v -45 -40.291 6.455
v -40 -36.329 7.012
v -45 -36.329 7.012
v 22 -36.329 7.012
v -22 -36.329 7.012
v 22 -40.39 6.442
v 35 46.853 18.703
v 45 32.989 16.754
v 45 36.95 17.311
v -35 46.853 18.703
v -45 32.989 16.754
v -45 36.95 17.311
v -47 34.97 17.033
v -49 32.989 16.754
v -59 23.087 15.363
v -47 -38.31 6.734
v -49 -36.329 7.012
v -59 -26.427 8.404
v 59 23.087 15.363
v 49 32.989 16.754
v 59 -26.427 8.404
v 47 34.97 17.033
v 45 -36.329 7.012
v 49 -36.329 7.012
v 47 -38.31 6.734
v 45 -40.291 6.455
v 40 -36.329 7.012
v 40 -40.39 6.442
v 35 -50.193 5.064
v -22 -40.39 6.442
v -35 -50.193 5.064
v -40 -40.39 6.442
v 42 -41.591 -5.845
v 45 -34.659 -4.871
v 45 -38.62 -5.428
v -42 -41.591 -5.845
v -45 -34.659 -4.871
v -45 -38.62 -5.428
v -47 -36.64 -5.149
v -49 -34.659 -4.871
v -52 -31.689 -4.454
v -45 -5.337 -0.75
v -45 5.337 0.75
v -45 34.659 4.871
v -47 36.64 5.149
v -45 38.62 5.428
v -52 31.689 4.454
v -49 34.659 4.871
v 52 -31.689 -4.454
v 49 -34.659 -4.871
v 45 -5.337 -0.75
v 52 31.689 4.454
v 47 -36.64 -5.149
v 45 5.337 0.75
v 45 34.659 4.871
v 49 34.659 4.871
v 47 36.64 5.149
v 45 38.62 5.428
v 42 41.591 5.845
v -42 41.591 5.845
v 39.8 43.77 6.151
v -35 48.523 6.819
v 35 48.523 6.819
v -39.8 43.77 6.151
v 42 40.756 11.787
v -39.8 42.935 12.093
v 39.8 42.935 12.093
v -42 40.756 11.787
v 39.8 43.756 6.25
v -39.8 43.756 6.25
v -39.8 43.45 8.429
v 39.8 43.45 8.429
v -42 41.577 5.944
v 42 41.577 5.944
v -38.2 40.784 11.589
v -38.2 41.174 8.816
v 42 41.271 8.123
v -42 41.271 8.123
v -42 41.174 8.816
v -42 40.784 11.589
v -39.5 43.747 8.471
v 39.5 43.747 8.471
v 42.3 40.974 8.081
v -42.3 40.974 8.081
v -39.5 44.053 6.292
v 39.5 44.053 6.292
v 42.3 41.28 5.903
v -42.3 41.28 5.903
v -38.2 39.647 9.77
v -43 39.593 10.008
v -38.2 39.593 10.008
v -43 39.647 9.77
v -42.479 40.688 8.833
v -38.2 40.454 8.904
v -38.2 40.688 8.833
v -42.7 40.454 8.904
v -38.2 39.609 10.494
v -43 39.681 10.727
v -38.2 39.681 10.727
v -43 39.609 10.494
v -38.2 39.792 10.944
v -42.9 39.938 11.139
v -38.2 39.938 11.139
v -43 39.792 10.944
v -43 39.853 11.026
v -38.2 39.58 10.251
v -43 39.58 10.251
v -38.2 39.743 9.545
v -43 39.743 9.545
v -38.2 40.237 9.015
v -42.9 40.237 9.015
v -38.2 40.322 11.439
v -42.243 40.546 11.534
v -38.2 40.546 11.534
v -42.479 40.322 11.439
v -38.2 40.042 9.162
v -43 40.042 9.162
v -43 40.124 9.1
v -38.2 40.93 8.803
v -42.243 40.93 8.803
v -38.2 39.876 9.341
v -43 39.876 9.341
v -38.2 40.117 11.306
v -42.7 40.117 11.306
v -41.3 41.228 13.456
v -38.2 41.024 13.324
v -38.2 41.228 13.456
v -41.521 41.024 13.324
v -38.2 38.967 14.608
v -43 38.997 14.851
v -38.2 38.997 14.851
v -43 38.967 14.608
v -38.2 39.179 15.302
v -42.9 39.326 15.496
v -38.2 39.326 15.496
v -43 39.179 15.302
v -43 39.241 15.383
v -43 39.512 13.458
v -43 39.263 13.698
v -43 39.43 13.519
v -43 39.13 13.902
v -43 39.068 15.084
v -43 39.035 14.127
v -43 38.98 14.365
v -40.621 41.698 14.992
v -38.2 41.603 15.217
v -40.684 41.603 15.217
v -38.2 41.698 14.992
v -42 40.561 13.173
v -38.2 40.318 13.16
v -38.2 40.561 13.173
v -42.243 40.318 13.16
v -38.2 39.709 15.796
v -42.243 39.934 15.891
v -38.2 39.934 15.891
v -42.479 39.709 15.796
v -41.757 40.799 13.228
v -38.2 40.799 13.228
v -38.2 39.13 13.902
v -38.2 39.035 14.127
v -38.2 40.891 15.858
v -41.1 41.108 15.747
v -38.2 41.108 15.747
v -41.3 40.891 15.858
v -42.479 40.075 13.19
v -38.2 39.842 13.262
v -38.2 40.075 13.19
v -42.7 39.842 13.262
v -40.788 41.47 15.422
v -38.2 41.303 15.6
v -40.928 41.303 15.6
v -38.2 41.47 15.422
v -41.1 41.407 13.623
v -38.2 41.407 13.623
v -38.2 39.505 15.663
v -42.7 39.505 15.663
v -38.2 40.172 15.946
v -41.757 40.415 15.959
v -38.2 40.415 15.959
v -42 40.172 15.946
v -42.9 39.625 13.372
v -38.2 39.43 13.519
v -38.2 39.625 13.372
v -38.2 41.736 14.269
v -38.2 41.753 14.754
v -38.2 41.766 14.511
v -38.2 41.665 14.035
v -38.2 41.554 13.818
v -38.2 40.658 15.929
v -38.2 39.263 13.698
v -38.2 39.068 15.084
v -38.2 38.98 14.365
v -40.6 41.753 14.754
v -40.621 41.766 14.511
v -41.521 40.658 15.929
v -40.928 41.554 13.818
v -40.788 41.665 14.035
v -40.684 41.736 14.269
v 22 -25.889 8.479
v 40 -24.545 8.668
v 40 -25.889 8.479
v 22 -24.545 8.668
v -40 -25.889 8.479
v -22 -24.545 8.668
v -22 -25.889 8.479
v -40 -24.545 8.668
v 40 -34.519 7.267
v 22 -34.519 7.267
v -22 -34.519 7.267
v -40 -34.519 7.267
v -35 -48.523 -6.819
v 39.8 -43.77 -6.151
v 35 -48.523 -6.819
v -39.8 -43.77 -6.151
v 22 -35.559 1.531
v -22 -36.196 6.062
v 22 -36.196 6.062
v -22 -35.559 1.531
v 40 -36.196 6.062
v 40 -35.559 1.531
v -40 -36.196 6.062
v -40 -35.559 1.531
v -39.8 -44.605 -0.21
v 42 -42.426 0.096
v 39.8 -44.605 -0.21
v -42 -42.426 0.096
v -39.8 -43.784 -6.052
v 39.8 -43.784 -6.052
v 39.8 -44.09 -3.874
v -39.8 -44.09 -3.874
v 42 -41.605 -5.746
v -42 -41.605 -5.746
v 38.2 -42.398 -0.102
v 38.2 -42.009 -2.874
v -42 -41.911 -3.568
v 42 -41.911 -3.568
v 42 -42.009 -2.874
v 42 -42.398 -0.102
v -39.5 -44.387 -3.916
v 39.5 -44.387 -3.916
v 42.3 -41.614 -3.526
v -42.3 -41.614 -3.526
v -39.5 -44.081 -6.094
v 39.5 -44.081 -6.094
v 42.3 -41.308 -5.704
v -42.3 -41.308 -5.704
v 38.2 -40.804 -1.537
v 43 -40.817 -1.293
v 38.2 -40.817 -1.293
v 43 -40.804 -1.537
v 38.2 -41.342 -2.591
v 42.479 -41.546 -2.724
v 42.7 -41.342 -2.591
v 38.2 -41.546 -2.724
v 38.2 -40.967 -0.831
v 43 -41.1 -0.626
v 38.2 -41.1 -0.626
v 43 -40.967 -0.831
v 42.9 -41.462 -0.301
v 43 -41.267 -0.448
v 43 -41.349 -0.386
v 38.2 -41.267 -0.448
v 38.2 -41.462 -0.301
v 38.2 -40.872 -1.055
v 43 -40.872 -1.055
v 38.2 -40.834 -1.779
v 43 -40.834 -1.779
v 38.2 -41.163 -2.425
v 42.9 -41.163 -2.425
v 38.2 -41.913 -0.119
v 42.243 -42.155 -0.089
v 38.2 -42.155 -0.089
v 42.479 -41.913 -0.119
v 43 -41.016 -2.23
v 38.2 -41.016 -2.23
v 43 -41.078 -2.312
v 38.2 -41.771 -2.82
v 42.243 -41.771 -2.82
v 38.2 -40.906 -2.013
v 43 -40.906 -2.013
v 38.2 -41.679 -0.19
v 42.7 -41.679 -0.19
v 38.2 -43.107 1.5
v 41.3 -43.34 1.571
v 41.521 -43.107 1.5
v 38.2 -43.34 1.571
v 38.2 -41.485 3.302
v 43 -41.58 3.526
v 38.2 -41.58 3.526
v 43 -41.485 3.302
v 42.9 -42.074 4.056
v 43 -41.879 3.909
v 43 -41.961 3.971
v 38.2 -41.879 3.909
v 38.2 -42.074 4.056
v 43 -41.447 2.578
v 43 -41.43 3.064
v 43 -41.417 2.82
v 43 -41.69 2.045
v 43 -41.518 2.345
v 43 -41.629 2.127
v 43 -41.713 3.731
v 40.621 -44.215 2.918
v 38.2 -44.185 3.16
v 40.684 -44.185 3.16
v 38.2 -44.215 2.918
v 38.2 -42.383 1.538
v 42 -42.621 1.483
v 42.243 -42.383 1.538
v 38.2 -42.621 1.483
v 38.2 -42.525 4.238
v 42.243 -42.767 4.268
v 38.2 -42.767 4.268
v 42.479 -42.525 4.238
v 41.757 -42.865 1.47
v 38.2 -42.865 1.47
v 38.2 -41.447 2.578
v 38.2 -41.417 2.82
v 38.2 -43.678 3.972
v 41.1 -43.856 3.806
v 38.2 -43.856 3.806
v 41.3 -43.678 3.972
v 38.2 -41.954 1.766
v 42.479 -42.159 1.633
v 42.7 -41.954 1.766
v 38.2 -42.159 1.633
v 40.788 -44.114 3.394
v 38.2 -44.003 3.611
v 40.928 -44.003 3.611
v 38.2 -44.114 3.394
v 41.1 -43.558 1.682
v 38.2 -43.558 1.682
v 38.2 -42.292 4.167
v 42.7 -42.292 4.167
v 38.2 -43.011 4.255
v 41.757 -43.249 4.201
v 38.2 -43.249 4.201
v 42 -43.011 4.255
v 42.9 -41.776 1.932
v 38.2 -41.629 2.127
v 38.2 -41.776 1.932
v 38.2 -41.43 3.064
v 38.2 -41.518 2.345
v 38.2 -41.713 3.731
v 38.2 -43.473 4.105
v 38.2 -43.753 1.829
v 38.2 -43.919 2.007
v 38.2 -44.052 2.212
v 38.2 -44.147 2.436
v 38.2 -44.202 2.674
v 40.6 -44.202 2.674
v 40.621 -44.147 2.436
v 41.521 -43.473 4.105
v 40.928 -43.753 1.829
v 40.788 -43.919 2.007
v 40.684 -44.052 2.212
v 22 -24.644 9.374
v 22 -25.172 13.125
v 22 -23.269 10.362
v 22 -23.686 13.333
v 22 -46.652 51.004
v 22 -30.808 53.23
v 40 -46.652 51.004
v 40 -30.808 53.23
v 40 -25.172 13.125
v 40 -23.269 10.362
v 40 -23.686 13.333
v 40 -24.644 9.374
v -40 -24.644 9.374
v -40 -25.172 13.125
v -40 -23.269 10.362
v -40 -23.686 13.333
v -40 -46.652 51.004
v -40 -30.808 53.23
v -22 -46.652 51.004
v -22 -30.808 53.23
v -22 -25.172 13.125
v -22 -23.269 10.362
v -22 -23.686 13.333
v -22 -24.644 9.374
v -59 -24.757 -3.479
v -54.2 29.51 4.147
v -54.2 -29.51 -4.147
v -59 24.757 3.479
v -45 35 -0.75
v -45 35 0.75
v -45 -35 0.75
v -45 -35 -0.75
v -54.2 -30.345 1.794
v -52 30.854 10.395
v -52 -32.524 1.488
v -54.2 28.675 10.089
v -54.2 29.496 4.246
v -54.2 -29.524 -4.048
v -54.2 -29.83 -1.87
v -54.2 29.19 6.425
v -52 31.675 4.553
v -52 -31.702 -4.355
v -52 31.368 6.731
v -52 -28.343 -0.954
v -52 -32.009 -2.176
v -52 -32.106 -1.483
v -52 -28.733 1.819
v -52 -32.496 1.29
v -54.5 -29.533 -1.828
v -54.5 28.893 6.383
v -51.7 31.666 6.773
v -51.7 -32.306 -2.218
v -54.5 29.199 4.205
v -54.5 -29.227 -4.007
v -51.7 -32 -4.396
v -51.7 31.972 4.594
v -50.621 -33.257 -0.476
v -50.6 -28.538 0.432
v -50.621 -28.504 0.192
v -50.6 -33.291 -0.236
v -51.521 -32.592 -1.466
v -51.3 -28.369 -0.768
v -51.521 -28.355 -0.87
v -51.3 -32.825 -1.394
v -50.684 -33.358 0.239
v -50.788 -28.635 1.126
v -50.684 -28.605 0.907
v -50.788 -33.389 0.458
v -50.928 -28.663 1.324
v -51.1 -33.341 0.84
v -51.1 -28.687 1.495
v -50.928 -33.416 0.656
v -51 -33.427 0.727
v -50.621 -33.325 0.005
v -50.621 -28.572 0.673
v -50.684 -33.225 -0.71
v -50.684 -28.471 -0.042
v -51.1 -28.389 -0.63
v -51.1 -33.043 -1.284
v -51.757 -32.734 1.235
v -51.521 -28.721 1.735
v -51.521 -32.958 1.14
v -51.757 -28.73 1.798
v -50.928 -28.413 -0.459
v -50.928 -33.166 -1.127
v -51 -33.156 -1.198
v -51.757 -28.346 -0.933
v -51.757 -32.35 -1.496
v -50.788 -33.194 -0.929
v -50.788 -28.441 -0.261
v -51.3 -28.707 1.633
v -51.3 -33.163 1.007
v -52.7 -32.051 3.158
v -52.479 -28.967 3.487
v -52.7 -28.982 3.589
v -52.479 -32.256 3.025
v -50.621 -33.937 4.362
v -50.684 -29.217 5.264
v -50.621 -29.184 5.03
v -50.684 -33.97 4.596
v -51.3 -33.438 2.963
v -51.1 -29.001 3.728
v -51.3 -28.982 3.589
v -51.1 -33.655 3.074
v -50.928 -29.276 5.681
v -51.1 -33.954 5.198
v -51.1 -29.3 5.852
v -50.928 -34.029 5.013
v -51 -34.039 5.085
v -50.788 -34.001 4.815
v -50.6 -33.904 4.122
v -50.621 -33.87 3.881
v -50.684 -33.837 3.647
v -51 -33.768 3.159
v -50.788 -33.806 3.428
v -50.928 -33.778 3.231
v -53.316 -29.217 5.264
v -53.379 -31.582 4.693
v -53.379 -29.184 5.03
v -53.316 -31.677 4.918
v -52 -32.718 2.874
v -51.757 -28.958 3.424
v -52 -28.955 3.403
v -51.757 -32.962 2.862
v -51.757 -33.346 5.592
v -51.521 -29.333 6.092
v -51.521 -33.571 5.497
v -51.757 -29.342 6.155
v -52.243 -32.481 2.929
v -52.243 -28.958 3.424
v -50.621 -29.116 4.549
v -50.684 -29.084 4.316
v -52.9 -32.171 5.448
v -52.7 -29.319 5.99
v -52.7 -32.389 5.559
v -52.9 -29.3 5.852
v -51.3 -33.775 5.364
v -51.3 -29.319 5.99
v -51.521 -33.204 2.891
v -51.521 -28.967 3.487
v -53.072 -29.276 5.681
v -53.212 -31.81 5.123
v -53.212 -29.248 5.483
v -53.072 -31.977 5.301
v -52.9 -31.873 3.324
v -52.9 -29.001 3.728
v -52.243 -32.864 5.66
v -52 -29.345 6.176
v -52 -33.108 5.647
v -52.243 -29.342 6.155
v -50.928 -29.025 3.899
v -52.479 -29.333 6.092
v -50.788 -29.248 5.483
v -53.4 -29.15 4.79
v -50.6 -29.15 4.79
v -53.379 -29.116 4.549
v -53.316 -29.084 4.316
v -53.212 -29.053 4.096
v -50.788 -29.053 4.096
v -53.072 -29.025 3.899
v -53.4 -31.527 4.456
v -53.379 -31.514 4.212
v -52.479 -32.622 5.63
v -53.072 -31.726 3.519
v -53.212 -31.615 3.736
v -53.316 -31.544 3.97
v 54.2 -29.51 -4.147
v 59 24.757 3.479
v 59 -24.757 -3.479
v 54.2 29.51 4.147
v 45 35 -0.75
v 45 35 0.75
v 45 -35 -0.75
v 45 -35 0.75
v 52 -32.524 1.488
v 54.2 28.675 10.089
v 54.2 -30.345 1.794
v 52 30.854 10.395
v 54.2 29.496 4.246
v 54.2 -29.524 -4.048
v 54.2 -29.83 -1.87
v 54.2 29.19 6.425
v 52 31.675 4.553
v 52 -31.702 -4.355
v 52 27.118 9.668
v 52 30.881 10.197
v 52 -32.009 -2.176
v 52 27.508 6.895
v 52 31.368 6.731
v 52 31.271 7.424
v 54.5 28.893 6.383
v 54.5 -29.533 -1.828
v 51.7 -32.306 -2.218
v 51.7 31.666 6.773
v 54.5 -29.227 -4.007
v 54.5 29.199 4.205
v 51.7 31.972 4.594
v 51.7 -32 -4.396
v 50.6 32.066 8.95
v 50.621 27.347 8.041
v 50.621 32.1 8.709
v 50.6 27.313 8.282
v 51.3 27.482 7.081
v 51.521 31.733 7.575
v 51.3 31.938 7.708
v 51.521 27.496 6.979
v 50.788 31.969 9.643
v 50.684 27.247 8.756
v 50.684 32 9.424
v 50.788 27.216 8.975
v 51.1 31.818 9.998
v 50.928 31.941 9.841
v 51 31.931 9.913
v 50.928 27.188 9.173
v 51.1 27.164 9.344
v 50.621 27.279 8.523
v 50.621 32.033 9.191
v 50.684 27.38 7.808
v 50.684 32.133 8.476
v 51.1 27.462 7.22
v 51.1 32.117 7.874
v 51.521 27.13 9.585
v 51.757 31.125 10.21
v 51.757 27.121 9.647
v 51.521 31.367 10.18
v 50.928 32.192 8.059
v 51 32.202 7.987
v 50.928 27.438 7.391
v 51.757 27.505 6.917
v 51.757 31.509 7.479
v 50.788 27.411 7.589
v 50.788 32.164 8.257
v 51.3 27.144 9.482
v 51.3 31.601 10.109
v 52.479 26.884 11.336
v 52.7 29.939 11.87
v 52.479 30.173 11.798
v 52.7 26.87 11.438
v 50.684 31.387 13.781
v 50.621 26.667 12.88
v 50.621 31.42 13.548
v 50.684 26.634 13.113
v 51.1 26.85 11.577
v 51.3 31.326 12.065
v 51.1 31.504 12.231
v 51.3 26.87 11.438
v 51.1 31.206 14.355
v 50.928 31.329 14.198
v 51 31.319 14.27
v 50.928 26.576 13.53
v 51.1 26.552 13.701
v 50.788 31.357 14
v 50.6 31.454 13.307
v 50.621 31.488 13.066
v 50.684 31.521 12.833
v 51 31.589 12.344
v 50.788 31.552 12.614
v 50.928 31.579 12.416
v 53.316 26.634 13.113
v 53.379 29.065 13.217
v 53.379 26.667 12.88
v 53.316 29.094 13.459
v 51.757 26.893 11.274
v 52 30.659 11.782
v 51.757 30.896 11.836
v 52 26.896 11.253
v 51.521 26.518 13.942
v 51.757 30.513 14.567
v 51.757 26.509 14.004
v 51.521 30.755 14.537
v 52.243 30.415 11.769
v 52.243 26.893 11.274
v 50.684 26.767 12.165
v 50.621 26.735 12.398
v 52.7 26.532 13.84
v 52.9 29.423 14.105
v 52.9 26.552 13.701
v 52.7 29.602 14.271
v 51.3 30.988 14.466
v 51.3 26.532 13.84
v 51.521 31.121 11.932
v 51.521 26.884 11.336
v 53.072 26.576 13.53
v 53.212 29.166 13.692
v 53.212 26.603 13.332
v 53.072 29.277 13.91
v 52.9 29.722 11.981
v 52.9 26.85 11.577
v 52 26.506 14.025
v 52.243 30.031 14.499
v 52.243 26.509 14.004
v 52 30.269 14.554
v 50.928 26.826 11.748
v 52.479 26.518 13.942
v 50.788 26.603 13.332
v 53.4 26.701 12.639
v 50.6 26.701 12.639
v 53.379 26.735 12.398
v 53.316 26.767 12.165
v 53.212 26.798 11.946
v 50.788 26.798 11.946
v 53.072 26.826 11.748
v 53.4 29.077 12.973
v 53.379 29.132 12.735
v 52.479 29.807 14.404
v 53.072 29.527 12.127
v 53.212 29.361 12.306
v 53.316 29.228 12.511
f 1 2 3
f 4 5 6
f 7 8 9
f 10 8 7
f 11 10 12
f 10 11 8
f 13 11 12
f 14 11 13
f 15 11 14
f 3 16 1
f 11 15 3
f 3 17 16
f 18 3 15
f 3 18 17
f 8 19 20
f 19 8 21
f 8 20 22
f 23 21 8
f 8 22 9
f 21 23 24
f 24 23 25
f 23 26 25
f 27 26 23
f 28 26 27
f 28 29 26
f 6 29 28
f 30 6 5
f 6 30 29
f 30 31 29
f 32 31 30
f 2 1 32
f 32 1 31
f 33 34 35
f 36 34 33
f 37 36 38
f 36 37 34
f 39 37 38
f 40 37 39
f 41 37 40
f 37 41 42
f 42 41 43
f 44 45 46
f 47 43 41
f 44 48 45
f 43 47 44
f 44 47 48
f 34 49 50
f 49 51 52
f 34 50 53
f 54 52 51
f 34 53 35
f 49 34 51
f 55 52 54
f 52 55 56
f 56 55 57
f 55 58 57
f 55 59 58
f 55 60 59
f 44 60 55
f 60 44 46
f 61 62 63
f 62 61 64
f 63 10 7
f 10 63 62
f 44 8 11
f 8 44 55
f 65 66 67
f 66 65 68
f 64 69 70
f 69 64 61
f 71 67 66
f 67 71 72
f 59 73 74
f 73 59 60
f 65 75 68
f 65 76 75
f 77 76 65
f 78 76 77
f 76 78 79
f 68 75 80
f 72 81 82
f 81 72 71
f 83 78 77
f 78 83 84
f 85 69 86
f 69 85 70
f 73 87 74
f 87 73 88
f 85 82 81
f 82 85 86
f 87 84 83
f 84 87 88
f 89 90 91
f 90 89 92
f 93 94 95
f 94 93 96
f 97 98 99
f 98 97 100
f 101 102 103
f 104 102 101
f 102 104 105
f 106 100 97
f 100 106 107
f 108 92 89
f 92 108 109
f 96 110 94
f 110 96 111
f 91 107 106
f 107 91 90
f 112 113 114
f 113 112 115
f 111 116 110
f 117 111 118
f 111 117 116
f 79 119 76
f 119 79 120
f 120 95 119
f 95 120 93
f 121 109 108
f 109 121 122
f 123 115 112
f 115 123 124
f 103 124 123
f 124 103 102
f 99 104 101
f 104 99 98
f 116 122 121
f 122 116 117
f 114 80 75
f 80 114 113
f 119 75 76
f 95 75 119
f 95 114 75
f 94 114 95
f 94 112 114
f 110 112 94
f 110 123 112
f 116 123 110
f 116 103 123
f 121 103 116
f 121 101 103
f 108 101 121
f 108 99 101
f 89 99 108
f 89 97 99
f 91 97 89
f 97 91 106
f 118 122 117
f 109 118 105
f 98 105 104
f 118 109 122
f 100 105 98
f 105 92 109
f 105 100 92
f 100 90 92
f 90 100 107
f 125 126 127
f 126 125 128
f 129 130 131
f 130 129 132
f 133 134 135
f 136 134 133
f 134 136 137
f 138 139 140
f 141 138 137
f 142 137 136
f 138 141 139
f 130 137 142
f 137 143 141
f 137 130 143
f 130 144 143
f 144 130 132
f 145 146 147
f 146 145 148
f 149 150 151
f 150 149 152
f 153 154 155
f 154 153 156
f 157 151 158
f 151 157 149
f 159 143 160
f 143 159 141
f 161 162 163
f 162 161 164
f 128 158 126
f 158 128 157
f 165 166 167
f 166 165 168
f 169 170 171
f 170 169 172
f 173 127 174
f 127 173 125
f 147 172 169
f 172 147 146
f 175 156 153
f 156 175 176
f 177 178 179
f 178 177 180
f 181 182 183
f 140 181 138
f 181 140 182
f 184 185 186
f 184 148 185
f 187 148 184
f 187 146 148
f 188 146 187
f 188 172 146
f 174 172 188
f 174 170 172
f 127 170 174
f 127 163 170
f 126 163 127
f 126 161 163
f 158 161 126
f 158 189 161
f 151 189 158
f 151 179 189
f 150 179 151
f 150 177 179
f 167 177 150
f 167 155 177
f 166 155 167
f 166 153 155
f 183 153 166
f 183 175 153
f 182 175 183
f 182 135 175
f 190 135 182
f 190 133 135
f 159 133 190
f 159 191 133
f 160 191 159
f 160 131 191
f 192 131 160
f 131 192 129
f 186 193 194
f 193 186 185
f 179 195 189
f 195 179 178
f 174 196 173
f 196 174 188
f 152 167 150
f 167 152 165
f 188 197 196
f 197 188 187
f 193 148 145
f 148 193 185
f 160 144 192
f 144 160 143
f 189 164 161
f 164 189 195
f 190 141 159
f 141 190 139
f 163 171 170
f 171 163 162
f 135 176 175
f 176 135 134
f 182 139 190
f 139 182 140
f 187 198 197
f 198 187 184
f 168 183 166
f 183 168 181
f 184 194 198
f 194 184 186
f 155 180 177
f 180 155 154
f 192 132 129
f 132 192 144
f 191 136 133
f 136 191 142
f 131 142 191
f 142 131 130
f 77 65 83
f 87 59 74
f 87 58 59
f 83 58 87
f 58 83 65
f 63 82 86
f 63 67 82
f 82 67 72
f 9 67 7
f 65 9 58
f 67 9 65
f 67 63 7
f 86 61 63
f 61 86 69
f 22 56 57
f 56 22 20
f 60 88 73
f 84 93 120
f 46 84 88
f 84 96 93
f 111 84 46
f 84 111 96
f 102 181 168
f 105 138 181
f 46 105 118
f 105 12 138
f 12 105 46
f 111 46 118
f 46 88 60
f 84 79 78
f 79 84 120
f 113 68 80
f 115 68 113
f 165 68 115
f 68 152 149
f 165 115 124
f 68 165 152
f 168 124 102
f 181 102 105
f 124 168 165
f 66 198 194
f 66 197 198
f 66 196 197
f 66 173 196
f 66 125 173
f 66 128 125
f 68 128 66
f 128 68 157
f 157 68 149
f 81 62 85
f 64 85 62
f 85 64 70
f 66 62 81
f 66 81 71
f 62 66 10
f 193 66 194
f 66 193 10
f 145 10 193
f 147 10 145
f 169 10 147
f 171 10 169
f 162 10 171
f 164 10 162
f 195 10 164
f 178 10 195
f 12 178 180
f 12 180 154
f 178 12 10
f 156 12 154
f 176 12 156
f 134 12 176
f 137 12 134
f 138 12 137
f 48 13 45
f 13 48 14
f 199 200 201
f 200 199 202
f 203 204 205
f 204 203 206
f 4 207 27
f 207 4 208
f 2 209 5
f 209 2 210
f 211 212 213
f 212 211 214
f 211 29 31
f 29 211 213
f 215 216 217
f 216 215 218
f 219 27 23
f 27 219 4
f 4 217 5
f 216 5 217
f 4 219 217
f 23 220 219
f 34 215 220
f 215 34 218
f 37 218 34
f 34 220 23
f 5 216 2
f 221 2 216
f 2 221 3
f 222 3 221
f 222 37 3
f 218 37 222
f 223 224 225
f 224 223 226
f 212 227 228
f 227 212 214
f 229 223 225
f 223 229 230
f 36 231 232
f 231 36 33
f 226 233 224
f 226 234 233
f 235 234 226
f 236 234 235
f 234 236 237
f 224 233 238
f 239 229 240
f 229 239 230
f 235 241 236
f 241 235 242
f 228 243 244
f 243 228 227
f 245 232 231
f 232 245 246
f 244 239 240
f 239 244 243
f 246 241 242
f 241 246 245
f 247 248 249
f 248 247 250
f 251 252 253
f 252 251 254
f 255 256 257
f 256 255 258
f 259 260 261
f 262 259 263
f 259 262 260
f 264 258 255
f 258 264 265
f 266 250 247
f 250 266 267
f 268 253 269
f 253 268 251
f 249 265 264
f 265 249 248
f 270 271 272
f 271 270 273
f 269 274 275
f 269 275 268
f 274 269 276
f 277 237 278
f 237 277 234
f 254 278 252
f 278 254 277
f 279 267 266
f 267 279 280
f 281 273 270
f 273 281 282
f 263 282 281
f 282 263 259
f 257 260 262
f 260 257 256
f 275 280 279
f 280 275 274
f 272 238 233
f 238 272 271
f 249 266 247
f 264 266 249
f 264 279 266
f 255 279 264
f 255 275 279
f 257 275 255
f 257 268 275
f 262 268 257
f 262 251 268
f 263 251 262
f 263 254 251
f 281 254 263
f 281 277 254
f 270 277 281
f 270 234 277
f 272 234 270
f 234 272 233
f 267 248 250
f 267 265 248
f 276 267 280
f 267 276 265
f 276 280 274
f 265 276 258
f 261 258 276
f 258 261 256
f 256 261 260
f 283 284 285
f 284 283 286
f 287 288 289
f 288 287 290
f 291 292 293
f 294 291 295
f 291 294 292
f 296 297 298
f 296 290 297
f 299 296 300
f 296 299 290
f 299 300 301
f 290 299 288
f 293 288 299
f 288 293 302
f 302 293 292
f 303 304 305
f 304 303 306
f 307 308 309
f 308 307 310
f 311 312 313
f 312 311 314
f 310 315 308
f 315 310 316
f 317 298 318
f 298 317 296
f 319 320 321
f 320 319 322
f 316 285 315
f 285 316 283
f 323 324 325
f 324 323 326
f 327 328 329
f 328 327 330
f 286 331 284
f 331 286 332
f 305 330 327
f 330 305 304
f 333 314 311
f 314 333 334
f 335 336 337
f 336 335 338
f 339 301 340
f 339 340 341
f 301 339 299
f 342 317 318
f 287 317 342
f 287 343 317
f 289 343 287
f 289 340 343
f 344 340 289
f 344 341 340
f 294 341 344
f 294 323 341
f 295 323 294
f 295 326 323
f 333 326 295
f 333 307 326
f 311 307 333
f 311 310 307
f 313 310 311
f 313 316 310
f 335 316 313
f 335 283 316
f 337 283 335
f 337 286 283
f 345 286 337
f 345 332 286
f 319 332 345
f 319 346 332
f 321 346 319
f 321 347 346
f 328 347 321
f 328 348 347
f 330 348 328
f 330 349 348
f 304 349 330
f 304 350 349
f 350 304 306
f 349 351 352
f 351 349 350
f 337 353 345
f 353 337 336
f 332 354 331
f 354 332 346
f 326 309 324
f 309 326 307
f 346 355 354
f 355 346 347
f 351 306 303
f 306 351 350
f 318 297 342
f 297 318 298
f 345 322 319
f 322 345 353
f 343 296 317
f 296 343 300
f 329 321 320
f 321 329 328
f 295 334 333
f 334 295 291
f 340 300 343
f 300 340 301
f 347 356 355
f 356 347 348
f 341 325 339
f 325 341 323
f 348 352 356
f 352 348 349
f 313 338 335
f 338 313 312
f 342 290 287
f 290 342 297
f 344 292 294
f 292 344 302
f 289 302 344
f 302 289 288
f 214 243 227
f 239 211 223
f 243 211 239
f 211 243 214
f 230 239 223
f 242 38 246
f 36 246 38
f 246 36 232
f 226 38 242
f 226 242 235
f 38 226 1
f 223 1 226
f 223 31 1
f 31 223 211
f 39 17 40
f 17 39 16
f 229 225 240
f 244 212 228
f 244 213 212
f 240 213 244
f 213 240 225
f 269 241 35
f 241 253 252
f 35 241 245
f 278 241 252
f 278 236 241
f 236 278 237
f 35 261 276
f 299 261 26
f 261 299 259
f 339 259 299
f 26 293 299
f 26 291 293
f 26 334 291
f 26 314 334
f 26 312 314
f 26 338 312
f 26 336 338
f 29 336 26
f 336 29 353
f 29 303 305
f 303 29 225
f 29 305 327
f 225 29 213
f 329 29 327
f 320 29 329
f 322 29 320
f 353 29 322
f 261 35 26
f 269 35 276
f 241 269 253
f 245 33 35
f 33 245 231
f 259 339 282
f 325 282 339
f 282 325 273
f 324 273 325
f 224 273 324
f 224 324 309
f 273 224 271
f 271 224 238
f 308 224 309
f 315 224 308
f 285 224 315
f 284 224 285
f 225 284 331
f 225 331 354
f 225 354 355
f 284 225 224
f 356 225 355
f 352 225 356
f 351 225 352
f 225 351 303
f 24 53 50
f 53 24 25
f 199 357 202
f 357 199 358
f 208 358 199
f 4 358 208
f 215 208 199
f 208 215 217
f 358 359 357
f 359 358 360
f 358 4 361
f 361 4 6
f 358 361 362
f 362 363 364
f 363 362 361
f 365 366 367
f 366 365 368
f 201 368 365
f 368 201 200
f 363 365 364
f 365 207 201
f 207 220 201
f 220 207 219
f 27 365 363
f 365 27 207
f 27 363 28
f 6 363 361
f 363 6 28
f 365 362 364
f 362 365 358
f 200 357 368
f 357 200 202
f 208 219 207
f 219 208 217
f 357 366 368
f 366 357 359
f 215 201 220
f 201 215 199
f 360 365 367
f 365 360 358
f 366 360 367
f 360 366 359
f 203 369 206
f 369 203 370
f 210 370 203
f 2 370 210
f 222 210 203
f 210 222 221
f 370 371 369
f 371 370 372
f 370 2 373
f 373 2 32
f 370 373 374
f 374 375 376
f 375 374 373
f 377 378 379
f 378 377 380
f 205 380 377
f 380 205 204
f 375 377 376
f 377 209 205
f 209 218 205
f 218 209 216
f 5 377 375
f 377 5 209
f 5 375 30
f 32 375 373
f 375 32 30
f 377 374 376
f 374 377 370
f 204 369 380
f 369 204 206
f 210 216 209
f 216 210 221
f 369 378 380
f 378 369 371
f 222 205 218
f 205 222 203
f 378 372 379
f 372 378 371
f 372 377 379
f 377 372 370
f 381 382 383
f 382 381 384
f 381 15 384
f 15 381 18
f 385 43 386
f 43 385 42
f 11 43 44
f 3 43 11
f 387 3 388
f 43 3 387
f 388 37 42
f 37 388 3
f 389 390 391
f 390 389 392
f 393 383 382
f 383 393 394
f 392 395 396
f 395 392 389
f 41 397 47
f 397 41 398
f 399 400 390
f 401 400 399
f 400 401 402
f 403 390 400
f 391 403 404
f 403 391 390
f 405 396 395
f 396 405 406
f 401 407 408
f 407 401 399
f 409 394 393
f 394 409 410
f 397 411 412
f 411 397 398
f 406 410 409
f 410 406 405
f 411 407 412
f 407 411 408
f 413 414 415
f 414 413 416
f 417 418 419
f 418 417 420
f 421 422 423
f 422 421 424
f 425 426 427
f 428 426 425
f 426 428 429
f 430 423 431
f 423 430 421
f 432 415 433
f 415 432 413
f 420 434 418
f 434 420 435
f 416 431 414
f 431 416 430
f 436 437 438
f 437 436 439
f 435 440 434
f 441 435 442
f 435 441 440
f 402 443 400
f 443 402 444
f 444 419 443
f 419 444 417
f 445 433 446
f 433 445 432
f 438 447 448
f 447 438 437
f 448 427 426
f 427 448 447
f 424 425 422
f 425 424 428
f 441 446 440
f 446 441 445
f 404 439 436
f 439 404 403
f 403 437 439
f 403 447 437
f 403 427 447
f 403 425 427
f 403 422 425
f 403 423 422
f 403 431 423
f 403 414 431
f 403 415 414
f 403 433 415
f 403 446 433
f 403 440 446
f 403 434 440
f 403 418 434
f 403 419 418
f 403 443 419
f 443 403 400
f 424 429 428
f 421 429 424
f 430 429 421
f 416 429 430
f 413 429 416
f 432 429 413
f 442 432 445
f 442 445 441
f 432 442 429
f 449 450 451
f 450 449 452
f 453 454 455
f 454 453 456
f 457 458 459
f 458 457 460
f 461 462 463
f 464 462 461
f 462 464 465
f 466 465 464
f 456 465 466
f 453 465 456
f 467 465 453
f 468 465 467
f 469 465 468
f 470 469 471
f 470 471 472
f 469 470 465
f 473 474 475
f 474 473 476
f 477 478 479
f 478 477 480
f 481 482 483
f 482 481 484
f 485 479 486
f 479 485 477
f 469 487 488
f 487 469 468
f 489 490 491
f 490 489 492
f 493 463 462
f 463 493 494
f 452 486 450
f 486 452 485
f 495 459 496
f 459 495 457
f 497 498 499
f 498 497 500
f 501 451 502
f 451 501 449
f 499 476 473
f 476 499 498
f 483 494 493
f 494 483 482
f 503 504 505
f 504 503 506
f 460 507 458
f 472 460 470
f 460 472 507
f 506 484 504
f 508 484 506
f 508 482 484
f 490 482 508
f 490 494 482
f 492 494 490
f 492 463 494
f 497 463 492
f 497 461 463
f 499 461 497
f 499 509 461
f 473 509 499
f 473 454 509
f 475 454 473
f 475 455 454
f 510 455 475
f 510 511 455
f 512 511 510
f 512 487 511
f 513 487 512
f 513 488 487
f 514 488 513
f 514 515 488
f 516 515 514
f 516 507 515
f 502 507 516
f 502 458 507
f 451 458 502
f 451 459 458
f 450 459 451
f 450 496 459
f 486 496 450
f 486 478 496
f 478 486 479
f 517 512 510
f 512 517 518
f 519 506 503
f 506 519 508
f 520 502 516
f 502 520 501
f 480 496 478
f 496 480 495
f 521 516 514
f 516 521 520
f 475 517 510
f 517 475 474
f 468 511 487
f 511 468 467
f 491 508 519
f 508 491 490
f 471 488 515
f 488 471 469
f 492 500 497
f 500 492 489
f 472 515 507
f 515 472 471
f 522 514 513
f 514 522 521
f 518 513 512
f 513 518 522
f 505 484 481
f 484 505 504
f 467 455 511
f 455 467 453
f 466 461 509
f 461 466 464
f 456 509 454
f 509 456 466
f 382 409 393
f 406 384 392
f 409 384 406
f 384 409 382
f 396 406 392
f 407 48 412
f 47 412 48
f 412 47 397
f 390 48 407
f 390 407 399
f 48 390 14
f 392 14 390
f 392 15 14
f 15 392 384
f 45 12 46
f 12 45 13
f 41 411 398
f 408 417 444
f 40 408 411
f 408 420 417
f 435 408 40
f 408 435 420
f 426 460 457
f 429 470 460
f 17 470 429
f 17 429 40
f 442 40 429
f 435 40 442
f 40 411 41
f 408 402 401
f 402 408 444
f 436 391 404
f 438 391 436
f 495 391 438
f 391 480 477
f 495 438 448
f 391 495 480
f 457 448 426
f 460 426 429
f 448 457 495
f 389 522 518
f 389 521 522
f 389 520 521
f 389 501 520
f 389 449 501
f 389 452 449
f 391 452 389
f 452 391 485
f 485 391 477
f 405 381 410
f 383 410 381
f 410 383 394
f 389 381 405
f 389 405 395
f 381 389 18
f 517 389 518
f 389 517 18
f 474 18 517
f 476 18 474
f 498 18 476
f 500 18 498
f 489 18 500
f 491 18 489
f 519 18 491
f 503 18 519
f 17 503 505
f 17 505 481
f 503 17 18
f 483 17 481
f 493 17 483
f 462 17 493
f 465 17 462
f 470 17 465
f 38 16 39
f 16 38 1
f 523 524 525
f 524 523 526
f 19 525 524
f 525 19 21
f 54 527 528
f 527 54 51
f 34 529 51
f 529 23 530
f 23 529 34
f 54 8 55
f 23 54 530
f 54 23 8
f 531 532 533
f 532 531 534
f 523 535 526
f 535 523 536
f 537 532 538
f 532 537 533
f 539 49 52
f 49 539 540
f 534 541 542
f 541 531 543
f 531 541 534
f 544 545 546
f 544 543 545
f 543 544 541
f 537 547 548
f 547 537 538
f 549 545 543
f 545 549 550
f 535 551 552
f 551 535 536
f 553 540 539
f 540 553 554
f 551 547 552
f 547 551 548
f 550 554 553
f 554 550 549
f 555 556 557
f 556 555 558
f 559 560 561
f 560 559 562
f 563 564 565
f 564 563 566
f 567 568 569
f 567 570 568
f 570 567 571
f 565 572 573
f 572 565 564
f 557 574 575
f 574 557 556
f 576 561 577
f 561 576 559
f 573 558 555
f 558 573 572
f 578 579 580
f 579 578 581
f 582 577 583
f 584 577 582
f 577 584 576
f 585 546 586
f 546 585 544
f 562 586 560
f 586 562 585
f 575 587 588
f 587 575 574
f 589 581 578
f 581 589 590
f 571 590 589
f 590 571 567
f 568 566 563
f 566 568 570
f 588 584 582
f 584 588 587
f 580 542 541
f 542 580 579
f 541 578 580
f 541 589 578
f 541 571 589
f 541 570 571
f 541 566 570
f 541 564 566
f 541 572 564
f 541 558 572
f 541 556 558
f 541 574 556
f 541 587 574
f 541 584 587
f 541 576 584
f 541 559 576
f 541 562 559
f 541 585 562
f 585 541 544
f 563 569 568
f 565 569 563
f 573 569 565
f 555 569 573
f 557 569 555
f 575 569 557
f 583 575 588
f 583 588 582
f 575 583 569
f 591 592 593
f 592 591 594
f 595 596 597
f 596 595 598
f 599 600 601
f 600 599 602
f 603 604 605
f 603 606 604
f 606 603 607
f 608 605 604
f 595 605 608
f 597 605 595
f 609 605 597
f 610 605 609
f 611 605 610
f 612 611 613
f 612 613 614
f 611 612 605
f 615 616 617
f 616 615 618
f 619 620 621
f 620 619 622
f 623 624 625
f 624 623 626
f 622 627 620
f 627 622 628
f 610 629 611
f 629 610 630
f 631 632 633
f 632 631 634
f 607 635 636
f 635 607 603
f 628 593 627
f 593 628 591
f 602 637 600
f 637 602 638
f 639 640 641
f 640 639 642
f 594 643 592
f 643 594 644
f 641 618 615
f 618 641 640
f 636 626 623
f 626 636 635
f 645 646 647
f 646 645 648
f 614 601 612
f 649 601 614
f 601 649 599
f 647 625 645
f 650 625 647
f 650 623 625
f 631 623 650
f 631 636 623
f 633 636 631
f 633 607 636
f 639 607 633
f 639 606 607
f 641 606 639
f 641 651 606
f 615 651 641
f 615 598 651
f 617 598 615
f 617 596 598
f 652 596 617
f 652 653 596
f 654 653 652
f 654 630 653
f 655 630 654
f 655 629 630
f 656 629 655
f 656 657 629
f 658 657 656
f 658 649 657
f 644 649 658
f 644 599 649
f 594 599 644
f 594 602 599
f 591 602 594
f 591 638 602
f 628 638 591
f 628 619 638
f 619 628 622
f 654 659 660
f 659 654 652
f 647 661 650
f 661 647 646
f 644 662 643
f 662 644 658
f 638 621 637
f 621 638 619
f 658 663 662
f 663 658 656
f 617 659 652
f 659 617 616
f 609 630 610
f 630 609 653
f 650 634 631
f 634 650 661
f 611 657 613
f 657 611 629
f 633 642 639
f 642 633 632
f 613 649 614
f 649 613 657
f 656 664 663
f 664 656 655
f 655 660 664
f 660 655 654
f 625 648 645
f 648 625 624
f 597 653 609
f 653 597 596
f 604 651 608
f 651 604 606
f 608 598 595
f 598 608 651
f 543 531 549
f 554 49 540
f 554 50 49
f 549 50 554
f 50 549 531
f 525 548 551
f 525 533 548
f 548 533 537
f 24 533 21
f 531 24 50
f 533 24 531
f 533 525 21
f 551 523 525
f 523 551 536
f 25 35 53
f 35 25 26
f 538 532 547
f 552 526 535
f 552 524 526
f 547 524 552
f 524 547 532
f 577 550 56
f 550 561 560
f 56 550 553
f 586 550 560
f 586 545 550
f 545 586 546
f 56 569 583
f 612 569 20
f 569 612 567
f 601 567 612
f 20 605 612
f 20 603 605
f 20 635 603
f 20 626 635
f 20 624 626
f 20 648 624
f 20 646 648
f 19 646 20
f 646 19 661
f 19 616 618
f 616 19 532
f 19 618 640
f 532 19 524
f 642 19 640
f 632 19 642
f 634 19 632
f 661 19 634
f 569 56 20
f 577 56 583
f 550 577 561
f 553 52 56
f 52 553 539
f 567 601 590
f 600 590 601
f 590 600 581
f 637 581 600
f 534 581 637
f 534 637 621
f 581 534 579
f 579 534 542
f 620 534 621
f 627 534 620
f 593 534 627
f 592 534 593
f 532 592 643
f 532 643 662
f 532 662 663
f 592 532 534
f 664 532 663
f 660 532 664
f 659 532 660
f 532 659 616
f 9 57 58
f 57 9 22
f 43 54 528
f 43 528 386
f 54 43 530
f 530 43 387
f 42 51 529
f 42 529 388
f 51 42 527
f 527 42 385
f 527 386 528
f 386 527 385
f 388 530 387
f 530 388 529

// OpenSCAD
// 4-piece PCB perimeter frame rails with 45° miter ends + press-fit pegs
// - PCB slides into U-channel in each rail
// - Rails have 45° miter ends so corners meet cleanly
// - Each corner has alignment pegs + matching holes (press fit + optional glue)
// - Legs on ONLY the bottom rail so PCB stands vertical (slight lean adjustable)
//
// PCB: 90 x 70 x 1.5 mm
// Units: mm

// ---------------- PCB ----------------
pcb_x  = 90;
pcb_y  = 70;
pcb_t  = 1.5;

// ---------------- Channel fit ----------------
slot_clear = 0.35;        // clearance around PCB thickness
slot_depth = 6.0;         // insertion depth into rail (>= pcb_t)
rail_depth = 12.0;        // rail depth (front->back, Z)
outer_h    = 14.0;        // rail height (Y)
wall       = 3.0;         // rail wall thickness around slot
face_top   = 4.0;         // "picture frame" face above the slot (Y)

// ---------------- Corner miter / assembly ----------------
miter = 45;               // keep 45
corner_setback = 0.0;     // increase if you want a tiny gap at corners

// Pegs/holes for corners
peg_d = 2.6;              // peg diameter (tune for your printer)
peg_len = 4.0;            // peg protrusion
peg_clear = 0.20;         // hole clearance over peg_d
peg_offset = 6.0;         // from miter plane inward along length
peg_z = rail_depth*0.55;  // peg depth location in Z
peg_y = outer_h*0.50;     // peg height location in Y
pegs_per_corner = 2;      // 1 or 2

// ---------------- Legs (bottom rail only) ----------------
legs_enable = true;
leg_w   = 18.0;           // along rail length
leg_th  = 3.0;
leg_len = 45.0;           // sticks back in Z
leg_drop= 16.0;           // drops down in Y (toward table)
leg_inset_from_end = 18.0;// from rail end
lean_deg = 8;             // positive leans frame backward (more stable)

// ---------------- Rendering ----------------
part = "assembly"; // "top", "bottom", "left", "right", "assembly"

// ---------------- Derived ----------------
slot_w = pcb_t + 2*slot_clear;

// Miter makes each rail shorter by its cross-section thickness projected.
// We want the *inner opening* to match pcb_x/pcb_y, so we compute inner spans
inner_x = pcb_x;   // visible/fit opening span between left/right rails (X)
inner_y = pcb_y;   // span between top/bottom rails (Y)

// For simple mitered rectangle using rail thickness in X/Y plane,
// set each rail length = inner_span + 2*(outer_h/2)*tan? (messy).
// Instead: build rails to a target length and assemble by positioning off the PCB.
Lx = pcb_x + 2*wall + 2; // a little extra; miter ends handle exact look
Ly = pcb_y + 2*wall + 2;

// ---------------- Helpers ----------------
module rail_solid(L){
  // Rail blank (rect prism) with U-channel cut
  difference() {
    translate([0, outer_h/2, rail_depth/2])
      cube([L, outer_h, rail_depth], center=true);

    // U-channel slot (runs along X, opens at front Z=0)
    // Slot positioned lower in Y so you get a "frame face" above it.
    slot_yc = (face_top + wall) + slot_w/2;
    translate([0, slot_yc, slot_depth/2])
      cube([L+0.6, slot_w, slot_depth], center=true);

    // Slightly wider mouth for easier insertion
    translate([0, slot_yc, 1.2])
      cube([L+0.6, slot_w+0.6, 2.2], center=true);
  }
}

module miter_end_cut(L, side=+1){
  // Cuts a 45° plane at one end of the rail.
  // side=+1 cuts the +X end, side=-1 cuts the -X end.
  // Implemented by subtracting an angled big cube.
  translate([side*(L/2), 0, 0])
    rotate([0,0, side*45])
      translate([side*60, outer_h/2, rail_depth/2])
        cube([120, outer_h*3, rail_depth*3], center=true);
}

module add_pegs(L, end=+1, orientation="peg"){
  // Place pegs or holes near one end (miter plane region).
  // end=+1 => +X end, end=-1 => -X end
  // orientation="peg" or "hole"
  x0 = end*(L/2 - peg_offset);

  for (i=[0:pegs_per_corner-1]) {
    // stagger pegs slightly in Z to prevent rotation
    dz = (pegs_per_corner==1) ? 0 : (i==0 ? -2.2 : +2.2);

    if (orientation=="peg") {
      translate([x0, peg_y, peg_z + dz])
        rotate([0,90,0])
          cylinder(d=peg_d, h=peg_len, center=false, $fn=36);
    } else {
      translate([x0, peg_y, peg_z + dz])
        rotate([0,90,0])
          cylinder(d=peg_d + peg_clear, h=peg_len + 0.8, center=false, $fn=36);
    }
  }
}

module rail(L, is_bottom=false){
  // One rail with 45° miters both ends, and one-end pegs / other-end holes
  // so corners can press-fit.
  difference(){
    union(){
      rail_solid(L);
      // Pegs at +X end (male)
      add_pegs(L, end=+1, orientation="peg");
    }

    // Miters
    miter_end_cut(L, side=+1);
    miter_end_cut(L, side=-1);

    // Holes at -X end (female)
    add_pegs(L, end=-1, orientation="hole");
  }

  // Legs on bottom rail only
  if (is_bottom && legs_enable){
    // two legs near ends
    for (sx=[-1,1]) {
      x = sx*(L/2 - leg_inset_from_end);
      // leg block behind the rail
      translate([x, wall + slot_w/2 - leg_drop/2, rail_depth + leg_len/2])
        cube([leg_w, leg_drop, leg_len], center=true);

      // brace
      hull() {
        translate([x, wall + slot_w/2, rail_depth*0.55])
          cube([leg_w, leg_th, leg_th], center=true);
        translate([x, wall + slot_w/2 - leg_drop, rail_depth + leg_th])
          cube([leg_w, leg_th, leg_th], center=true);
      }
    }
  }
}

// ---------------- Assembly preview ----------------
module assembly(){
  // PCB preview
  color([0,0.6,0,0.35])
    cube([pcb_x, pcb_y, pcb_t], center=true);

  // Tilt frame slightly back by rotating rails/pcb as a group (preview only)
  rotate([lean_deg,0,0]) {

    // Top / Bottom rails (length along X)
    color("lightgray")  translate([0,  pcb_y/2, 0]) rail(Lx, is_bottom=false);
    color("gainsboro")  translate([0, -pcb_y/2, 0]) rotate([0,0,180]) rail(Lx, is_bottom=true);

    // Left / Right rails (length along Y): rotate rails 90° so their length runs in Y
    color("lightgray")  translate([-pcb_x/2, 0, 0]) rotate([0,0, 90]) rail(Ly, is_bottom=false);
    color("gainsboro")  translate([ pcb_x/2, 0, 0]) rotate([0,0,-90]) rail(Ly, is_bottom=false);
  }
}

// ---------------- Part outputs ----------------
if (part=="top")    rail(Lx, is_bottom=false);
if (part=="bottom") rail(Lx, is_bottom=true);
if (part=="left")   rotate([0,0, 90]) rail(Ly, is_bottom=false);
if (part=="right")  rotate([0,0,-90]) rail(Ly, is_bottom=false);
if (part=="assembly") assembly();
